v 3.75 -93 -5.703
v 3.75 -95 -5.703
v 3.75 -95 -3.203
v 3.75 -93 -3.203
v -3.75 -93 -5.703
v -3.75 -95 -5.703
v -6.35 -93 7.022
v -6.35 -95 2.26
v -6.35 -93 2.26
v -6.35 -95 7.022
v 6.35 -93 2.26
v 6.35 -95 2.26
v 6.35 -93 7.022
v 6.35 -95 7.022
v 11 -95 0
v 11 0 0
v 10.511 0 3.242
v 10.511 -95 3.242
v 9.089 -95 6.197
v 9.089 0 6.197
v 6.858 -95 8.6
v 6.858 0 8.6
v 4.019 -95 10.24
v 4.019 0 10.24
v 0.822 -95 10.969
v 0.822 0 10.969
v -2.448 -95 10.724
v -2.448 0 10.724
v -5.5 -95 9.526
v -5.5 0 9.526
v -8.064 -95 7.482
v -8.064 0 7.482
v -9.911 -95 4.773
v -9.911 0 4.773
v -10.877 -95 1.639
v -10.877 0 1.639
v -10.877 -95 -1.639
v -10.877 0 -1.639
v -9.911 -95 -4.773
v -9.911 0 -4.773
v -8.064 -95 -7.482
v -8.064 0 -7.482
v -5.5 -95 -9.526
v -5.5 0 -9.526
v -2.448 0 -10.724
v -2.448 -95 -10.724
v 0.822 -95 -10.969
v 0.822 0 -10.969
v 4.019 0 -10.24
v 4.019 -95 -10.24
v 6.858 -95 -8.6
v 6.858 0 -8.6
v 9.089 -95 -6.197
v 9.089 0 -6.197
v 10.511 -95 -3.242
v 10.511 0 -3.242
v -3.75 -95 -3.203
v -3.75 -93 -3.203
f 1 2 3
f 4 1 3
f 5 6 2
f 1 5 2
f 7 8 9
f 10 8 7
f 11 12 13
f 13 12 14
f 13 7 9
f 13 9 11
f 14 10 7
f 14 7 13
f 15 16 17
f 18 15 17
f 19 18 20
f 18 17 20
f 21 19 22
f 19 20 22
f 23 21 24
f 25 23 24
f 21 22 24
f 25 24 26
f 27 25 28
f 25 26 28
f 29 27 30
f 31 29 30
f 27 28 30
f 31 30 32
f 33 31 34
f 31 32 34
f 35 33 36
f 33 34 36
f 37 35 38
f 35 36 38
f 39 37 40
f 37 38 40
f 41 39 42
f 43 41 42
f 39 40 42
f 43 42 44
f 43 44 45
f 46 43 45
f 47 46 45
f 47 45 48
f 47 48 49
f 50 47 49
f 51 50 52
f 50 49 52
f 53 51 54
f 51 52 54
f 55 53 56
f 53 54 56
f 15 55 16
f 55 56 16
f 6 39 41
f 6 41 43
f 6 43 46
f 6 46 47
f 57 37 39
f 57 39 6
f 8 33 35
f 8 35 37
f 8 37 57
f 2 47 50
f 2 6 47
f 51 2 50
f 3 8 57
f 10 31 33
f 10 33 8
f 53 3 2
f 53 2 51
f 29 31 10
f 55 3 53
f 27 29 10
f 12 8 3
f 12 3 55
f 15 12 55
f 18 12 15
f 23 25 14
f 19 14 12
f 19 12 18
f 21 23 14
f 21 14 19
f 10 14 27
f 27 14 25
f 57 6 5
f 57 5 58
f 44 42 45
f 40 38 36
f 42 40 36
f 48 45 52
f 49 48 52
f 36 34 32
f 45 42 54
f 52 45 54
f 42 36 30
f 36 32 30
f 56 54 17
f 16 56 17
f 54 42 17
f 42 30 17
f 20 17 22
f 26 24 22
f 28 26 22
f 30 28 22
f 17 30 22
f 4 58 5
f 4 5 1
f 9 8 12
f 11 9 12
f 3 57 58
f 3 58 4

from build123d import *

# Parameters (mm, degrees)
F0_R     = 11
F1_DEPTH = 95
F2_W     = 12.7
F2_H     = 4.7625
F2_W_2   = 7.5
F2_H_2   = 2.5
F3_DEPTH = 2


# Not quite as in the source:
# - a feature names something its author has since deleted; it is built from what else it names


with BuildPart() as f1:
    # F0 (on Front) → F1 (new body)
    with BuildSketch(Plane.XZ):
        Circle(F0_R)
    extrude(amount=F1_DEPTH)

    # F2 (on face) → F3 (cut)
    with BuildSketch(Plane.XZ.offset(95)):
        with Locations((0, 4.6411268625)):
            Rectangle(F2_W, F2_H)
        with Locations((0, -4.4527297777)):
            Rectangle(F2_W_2, F2_H_2)
    extrude(amount=-F3_DEPTH, mode=Mode.SUBTRACT)


solid = f1.part
